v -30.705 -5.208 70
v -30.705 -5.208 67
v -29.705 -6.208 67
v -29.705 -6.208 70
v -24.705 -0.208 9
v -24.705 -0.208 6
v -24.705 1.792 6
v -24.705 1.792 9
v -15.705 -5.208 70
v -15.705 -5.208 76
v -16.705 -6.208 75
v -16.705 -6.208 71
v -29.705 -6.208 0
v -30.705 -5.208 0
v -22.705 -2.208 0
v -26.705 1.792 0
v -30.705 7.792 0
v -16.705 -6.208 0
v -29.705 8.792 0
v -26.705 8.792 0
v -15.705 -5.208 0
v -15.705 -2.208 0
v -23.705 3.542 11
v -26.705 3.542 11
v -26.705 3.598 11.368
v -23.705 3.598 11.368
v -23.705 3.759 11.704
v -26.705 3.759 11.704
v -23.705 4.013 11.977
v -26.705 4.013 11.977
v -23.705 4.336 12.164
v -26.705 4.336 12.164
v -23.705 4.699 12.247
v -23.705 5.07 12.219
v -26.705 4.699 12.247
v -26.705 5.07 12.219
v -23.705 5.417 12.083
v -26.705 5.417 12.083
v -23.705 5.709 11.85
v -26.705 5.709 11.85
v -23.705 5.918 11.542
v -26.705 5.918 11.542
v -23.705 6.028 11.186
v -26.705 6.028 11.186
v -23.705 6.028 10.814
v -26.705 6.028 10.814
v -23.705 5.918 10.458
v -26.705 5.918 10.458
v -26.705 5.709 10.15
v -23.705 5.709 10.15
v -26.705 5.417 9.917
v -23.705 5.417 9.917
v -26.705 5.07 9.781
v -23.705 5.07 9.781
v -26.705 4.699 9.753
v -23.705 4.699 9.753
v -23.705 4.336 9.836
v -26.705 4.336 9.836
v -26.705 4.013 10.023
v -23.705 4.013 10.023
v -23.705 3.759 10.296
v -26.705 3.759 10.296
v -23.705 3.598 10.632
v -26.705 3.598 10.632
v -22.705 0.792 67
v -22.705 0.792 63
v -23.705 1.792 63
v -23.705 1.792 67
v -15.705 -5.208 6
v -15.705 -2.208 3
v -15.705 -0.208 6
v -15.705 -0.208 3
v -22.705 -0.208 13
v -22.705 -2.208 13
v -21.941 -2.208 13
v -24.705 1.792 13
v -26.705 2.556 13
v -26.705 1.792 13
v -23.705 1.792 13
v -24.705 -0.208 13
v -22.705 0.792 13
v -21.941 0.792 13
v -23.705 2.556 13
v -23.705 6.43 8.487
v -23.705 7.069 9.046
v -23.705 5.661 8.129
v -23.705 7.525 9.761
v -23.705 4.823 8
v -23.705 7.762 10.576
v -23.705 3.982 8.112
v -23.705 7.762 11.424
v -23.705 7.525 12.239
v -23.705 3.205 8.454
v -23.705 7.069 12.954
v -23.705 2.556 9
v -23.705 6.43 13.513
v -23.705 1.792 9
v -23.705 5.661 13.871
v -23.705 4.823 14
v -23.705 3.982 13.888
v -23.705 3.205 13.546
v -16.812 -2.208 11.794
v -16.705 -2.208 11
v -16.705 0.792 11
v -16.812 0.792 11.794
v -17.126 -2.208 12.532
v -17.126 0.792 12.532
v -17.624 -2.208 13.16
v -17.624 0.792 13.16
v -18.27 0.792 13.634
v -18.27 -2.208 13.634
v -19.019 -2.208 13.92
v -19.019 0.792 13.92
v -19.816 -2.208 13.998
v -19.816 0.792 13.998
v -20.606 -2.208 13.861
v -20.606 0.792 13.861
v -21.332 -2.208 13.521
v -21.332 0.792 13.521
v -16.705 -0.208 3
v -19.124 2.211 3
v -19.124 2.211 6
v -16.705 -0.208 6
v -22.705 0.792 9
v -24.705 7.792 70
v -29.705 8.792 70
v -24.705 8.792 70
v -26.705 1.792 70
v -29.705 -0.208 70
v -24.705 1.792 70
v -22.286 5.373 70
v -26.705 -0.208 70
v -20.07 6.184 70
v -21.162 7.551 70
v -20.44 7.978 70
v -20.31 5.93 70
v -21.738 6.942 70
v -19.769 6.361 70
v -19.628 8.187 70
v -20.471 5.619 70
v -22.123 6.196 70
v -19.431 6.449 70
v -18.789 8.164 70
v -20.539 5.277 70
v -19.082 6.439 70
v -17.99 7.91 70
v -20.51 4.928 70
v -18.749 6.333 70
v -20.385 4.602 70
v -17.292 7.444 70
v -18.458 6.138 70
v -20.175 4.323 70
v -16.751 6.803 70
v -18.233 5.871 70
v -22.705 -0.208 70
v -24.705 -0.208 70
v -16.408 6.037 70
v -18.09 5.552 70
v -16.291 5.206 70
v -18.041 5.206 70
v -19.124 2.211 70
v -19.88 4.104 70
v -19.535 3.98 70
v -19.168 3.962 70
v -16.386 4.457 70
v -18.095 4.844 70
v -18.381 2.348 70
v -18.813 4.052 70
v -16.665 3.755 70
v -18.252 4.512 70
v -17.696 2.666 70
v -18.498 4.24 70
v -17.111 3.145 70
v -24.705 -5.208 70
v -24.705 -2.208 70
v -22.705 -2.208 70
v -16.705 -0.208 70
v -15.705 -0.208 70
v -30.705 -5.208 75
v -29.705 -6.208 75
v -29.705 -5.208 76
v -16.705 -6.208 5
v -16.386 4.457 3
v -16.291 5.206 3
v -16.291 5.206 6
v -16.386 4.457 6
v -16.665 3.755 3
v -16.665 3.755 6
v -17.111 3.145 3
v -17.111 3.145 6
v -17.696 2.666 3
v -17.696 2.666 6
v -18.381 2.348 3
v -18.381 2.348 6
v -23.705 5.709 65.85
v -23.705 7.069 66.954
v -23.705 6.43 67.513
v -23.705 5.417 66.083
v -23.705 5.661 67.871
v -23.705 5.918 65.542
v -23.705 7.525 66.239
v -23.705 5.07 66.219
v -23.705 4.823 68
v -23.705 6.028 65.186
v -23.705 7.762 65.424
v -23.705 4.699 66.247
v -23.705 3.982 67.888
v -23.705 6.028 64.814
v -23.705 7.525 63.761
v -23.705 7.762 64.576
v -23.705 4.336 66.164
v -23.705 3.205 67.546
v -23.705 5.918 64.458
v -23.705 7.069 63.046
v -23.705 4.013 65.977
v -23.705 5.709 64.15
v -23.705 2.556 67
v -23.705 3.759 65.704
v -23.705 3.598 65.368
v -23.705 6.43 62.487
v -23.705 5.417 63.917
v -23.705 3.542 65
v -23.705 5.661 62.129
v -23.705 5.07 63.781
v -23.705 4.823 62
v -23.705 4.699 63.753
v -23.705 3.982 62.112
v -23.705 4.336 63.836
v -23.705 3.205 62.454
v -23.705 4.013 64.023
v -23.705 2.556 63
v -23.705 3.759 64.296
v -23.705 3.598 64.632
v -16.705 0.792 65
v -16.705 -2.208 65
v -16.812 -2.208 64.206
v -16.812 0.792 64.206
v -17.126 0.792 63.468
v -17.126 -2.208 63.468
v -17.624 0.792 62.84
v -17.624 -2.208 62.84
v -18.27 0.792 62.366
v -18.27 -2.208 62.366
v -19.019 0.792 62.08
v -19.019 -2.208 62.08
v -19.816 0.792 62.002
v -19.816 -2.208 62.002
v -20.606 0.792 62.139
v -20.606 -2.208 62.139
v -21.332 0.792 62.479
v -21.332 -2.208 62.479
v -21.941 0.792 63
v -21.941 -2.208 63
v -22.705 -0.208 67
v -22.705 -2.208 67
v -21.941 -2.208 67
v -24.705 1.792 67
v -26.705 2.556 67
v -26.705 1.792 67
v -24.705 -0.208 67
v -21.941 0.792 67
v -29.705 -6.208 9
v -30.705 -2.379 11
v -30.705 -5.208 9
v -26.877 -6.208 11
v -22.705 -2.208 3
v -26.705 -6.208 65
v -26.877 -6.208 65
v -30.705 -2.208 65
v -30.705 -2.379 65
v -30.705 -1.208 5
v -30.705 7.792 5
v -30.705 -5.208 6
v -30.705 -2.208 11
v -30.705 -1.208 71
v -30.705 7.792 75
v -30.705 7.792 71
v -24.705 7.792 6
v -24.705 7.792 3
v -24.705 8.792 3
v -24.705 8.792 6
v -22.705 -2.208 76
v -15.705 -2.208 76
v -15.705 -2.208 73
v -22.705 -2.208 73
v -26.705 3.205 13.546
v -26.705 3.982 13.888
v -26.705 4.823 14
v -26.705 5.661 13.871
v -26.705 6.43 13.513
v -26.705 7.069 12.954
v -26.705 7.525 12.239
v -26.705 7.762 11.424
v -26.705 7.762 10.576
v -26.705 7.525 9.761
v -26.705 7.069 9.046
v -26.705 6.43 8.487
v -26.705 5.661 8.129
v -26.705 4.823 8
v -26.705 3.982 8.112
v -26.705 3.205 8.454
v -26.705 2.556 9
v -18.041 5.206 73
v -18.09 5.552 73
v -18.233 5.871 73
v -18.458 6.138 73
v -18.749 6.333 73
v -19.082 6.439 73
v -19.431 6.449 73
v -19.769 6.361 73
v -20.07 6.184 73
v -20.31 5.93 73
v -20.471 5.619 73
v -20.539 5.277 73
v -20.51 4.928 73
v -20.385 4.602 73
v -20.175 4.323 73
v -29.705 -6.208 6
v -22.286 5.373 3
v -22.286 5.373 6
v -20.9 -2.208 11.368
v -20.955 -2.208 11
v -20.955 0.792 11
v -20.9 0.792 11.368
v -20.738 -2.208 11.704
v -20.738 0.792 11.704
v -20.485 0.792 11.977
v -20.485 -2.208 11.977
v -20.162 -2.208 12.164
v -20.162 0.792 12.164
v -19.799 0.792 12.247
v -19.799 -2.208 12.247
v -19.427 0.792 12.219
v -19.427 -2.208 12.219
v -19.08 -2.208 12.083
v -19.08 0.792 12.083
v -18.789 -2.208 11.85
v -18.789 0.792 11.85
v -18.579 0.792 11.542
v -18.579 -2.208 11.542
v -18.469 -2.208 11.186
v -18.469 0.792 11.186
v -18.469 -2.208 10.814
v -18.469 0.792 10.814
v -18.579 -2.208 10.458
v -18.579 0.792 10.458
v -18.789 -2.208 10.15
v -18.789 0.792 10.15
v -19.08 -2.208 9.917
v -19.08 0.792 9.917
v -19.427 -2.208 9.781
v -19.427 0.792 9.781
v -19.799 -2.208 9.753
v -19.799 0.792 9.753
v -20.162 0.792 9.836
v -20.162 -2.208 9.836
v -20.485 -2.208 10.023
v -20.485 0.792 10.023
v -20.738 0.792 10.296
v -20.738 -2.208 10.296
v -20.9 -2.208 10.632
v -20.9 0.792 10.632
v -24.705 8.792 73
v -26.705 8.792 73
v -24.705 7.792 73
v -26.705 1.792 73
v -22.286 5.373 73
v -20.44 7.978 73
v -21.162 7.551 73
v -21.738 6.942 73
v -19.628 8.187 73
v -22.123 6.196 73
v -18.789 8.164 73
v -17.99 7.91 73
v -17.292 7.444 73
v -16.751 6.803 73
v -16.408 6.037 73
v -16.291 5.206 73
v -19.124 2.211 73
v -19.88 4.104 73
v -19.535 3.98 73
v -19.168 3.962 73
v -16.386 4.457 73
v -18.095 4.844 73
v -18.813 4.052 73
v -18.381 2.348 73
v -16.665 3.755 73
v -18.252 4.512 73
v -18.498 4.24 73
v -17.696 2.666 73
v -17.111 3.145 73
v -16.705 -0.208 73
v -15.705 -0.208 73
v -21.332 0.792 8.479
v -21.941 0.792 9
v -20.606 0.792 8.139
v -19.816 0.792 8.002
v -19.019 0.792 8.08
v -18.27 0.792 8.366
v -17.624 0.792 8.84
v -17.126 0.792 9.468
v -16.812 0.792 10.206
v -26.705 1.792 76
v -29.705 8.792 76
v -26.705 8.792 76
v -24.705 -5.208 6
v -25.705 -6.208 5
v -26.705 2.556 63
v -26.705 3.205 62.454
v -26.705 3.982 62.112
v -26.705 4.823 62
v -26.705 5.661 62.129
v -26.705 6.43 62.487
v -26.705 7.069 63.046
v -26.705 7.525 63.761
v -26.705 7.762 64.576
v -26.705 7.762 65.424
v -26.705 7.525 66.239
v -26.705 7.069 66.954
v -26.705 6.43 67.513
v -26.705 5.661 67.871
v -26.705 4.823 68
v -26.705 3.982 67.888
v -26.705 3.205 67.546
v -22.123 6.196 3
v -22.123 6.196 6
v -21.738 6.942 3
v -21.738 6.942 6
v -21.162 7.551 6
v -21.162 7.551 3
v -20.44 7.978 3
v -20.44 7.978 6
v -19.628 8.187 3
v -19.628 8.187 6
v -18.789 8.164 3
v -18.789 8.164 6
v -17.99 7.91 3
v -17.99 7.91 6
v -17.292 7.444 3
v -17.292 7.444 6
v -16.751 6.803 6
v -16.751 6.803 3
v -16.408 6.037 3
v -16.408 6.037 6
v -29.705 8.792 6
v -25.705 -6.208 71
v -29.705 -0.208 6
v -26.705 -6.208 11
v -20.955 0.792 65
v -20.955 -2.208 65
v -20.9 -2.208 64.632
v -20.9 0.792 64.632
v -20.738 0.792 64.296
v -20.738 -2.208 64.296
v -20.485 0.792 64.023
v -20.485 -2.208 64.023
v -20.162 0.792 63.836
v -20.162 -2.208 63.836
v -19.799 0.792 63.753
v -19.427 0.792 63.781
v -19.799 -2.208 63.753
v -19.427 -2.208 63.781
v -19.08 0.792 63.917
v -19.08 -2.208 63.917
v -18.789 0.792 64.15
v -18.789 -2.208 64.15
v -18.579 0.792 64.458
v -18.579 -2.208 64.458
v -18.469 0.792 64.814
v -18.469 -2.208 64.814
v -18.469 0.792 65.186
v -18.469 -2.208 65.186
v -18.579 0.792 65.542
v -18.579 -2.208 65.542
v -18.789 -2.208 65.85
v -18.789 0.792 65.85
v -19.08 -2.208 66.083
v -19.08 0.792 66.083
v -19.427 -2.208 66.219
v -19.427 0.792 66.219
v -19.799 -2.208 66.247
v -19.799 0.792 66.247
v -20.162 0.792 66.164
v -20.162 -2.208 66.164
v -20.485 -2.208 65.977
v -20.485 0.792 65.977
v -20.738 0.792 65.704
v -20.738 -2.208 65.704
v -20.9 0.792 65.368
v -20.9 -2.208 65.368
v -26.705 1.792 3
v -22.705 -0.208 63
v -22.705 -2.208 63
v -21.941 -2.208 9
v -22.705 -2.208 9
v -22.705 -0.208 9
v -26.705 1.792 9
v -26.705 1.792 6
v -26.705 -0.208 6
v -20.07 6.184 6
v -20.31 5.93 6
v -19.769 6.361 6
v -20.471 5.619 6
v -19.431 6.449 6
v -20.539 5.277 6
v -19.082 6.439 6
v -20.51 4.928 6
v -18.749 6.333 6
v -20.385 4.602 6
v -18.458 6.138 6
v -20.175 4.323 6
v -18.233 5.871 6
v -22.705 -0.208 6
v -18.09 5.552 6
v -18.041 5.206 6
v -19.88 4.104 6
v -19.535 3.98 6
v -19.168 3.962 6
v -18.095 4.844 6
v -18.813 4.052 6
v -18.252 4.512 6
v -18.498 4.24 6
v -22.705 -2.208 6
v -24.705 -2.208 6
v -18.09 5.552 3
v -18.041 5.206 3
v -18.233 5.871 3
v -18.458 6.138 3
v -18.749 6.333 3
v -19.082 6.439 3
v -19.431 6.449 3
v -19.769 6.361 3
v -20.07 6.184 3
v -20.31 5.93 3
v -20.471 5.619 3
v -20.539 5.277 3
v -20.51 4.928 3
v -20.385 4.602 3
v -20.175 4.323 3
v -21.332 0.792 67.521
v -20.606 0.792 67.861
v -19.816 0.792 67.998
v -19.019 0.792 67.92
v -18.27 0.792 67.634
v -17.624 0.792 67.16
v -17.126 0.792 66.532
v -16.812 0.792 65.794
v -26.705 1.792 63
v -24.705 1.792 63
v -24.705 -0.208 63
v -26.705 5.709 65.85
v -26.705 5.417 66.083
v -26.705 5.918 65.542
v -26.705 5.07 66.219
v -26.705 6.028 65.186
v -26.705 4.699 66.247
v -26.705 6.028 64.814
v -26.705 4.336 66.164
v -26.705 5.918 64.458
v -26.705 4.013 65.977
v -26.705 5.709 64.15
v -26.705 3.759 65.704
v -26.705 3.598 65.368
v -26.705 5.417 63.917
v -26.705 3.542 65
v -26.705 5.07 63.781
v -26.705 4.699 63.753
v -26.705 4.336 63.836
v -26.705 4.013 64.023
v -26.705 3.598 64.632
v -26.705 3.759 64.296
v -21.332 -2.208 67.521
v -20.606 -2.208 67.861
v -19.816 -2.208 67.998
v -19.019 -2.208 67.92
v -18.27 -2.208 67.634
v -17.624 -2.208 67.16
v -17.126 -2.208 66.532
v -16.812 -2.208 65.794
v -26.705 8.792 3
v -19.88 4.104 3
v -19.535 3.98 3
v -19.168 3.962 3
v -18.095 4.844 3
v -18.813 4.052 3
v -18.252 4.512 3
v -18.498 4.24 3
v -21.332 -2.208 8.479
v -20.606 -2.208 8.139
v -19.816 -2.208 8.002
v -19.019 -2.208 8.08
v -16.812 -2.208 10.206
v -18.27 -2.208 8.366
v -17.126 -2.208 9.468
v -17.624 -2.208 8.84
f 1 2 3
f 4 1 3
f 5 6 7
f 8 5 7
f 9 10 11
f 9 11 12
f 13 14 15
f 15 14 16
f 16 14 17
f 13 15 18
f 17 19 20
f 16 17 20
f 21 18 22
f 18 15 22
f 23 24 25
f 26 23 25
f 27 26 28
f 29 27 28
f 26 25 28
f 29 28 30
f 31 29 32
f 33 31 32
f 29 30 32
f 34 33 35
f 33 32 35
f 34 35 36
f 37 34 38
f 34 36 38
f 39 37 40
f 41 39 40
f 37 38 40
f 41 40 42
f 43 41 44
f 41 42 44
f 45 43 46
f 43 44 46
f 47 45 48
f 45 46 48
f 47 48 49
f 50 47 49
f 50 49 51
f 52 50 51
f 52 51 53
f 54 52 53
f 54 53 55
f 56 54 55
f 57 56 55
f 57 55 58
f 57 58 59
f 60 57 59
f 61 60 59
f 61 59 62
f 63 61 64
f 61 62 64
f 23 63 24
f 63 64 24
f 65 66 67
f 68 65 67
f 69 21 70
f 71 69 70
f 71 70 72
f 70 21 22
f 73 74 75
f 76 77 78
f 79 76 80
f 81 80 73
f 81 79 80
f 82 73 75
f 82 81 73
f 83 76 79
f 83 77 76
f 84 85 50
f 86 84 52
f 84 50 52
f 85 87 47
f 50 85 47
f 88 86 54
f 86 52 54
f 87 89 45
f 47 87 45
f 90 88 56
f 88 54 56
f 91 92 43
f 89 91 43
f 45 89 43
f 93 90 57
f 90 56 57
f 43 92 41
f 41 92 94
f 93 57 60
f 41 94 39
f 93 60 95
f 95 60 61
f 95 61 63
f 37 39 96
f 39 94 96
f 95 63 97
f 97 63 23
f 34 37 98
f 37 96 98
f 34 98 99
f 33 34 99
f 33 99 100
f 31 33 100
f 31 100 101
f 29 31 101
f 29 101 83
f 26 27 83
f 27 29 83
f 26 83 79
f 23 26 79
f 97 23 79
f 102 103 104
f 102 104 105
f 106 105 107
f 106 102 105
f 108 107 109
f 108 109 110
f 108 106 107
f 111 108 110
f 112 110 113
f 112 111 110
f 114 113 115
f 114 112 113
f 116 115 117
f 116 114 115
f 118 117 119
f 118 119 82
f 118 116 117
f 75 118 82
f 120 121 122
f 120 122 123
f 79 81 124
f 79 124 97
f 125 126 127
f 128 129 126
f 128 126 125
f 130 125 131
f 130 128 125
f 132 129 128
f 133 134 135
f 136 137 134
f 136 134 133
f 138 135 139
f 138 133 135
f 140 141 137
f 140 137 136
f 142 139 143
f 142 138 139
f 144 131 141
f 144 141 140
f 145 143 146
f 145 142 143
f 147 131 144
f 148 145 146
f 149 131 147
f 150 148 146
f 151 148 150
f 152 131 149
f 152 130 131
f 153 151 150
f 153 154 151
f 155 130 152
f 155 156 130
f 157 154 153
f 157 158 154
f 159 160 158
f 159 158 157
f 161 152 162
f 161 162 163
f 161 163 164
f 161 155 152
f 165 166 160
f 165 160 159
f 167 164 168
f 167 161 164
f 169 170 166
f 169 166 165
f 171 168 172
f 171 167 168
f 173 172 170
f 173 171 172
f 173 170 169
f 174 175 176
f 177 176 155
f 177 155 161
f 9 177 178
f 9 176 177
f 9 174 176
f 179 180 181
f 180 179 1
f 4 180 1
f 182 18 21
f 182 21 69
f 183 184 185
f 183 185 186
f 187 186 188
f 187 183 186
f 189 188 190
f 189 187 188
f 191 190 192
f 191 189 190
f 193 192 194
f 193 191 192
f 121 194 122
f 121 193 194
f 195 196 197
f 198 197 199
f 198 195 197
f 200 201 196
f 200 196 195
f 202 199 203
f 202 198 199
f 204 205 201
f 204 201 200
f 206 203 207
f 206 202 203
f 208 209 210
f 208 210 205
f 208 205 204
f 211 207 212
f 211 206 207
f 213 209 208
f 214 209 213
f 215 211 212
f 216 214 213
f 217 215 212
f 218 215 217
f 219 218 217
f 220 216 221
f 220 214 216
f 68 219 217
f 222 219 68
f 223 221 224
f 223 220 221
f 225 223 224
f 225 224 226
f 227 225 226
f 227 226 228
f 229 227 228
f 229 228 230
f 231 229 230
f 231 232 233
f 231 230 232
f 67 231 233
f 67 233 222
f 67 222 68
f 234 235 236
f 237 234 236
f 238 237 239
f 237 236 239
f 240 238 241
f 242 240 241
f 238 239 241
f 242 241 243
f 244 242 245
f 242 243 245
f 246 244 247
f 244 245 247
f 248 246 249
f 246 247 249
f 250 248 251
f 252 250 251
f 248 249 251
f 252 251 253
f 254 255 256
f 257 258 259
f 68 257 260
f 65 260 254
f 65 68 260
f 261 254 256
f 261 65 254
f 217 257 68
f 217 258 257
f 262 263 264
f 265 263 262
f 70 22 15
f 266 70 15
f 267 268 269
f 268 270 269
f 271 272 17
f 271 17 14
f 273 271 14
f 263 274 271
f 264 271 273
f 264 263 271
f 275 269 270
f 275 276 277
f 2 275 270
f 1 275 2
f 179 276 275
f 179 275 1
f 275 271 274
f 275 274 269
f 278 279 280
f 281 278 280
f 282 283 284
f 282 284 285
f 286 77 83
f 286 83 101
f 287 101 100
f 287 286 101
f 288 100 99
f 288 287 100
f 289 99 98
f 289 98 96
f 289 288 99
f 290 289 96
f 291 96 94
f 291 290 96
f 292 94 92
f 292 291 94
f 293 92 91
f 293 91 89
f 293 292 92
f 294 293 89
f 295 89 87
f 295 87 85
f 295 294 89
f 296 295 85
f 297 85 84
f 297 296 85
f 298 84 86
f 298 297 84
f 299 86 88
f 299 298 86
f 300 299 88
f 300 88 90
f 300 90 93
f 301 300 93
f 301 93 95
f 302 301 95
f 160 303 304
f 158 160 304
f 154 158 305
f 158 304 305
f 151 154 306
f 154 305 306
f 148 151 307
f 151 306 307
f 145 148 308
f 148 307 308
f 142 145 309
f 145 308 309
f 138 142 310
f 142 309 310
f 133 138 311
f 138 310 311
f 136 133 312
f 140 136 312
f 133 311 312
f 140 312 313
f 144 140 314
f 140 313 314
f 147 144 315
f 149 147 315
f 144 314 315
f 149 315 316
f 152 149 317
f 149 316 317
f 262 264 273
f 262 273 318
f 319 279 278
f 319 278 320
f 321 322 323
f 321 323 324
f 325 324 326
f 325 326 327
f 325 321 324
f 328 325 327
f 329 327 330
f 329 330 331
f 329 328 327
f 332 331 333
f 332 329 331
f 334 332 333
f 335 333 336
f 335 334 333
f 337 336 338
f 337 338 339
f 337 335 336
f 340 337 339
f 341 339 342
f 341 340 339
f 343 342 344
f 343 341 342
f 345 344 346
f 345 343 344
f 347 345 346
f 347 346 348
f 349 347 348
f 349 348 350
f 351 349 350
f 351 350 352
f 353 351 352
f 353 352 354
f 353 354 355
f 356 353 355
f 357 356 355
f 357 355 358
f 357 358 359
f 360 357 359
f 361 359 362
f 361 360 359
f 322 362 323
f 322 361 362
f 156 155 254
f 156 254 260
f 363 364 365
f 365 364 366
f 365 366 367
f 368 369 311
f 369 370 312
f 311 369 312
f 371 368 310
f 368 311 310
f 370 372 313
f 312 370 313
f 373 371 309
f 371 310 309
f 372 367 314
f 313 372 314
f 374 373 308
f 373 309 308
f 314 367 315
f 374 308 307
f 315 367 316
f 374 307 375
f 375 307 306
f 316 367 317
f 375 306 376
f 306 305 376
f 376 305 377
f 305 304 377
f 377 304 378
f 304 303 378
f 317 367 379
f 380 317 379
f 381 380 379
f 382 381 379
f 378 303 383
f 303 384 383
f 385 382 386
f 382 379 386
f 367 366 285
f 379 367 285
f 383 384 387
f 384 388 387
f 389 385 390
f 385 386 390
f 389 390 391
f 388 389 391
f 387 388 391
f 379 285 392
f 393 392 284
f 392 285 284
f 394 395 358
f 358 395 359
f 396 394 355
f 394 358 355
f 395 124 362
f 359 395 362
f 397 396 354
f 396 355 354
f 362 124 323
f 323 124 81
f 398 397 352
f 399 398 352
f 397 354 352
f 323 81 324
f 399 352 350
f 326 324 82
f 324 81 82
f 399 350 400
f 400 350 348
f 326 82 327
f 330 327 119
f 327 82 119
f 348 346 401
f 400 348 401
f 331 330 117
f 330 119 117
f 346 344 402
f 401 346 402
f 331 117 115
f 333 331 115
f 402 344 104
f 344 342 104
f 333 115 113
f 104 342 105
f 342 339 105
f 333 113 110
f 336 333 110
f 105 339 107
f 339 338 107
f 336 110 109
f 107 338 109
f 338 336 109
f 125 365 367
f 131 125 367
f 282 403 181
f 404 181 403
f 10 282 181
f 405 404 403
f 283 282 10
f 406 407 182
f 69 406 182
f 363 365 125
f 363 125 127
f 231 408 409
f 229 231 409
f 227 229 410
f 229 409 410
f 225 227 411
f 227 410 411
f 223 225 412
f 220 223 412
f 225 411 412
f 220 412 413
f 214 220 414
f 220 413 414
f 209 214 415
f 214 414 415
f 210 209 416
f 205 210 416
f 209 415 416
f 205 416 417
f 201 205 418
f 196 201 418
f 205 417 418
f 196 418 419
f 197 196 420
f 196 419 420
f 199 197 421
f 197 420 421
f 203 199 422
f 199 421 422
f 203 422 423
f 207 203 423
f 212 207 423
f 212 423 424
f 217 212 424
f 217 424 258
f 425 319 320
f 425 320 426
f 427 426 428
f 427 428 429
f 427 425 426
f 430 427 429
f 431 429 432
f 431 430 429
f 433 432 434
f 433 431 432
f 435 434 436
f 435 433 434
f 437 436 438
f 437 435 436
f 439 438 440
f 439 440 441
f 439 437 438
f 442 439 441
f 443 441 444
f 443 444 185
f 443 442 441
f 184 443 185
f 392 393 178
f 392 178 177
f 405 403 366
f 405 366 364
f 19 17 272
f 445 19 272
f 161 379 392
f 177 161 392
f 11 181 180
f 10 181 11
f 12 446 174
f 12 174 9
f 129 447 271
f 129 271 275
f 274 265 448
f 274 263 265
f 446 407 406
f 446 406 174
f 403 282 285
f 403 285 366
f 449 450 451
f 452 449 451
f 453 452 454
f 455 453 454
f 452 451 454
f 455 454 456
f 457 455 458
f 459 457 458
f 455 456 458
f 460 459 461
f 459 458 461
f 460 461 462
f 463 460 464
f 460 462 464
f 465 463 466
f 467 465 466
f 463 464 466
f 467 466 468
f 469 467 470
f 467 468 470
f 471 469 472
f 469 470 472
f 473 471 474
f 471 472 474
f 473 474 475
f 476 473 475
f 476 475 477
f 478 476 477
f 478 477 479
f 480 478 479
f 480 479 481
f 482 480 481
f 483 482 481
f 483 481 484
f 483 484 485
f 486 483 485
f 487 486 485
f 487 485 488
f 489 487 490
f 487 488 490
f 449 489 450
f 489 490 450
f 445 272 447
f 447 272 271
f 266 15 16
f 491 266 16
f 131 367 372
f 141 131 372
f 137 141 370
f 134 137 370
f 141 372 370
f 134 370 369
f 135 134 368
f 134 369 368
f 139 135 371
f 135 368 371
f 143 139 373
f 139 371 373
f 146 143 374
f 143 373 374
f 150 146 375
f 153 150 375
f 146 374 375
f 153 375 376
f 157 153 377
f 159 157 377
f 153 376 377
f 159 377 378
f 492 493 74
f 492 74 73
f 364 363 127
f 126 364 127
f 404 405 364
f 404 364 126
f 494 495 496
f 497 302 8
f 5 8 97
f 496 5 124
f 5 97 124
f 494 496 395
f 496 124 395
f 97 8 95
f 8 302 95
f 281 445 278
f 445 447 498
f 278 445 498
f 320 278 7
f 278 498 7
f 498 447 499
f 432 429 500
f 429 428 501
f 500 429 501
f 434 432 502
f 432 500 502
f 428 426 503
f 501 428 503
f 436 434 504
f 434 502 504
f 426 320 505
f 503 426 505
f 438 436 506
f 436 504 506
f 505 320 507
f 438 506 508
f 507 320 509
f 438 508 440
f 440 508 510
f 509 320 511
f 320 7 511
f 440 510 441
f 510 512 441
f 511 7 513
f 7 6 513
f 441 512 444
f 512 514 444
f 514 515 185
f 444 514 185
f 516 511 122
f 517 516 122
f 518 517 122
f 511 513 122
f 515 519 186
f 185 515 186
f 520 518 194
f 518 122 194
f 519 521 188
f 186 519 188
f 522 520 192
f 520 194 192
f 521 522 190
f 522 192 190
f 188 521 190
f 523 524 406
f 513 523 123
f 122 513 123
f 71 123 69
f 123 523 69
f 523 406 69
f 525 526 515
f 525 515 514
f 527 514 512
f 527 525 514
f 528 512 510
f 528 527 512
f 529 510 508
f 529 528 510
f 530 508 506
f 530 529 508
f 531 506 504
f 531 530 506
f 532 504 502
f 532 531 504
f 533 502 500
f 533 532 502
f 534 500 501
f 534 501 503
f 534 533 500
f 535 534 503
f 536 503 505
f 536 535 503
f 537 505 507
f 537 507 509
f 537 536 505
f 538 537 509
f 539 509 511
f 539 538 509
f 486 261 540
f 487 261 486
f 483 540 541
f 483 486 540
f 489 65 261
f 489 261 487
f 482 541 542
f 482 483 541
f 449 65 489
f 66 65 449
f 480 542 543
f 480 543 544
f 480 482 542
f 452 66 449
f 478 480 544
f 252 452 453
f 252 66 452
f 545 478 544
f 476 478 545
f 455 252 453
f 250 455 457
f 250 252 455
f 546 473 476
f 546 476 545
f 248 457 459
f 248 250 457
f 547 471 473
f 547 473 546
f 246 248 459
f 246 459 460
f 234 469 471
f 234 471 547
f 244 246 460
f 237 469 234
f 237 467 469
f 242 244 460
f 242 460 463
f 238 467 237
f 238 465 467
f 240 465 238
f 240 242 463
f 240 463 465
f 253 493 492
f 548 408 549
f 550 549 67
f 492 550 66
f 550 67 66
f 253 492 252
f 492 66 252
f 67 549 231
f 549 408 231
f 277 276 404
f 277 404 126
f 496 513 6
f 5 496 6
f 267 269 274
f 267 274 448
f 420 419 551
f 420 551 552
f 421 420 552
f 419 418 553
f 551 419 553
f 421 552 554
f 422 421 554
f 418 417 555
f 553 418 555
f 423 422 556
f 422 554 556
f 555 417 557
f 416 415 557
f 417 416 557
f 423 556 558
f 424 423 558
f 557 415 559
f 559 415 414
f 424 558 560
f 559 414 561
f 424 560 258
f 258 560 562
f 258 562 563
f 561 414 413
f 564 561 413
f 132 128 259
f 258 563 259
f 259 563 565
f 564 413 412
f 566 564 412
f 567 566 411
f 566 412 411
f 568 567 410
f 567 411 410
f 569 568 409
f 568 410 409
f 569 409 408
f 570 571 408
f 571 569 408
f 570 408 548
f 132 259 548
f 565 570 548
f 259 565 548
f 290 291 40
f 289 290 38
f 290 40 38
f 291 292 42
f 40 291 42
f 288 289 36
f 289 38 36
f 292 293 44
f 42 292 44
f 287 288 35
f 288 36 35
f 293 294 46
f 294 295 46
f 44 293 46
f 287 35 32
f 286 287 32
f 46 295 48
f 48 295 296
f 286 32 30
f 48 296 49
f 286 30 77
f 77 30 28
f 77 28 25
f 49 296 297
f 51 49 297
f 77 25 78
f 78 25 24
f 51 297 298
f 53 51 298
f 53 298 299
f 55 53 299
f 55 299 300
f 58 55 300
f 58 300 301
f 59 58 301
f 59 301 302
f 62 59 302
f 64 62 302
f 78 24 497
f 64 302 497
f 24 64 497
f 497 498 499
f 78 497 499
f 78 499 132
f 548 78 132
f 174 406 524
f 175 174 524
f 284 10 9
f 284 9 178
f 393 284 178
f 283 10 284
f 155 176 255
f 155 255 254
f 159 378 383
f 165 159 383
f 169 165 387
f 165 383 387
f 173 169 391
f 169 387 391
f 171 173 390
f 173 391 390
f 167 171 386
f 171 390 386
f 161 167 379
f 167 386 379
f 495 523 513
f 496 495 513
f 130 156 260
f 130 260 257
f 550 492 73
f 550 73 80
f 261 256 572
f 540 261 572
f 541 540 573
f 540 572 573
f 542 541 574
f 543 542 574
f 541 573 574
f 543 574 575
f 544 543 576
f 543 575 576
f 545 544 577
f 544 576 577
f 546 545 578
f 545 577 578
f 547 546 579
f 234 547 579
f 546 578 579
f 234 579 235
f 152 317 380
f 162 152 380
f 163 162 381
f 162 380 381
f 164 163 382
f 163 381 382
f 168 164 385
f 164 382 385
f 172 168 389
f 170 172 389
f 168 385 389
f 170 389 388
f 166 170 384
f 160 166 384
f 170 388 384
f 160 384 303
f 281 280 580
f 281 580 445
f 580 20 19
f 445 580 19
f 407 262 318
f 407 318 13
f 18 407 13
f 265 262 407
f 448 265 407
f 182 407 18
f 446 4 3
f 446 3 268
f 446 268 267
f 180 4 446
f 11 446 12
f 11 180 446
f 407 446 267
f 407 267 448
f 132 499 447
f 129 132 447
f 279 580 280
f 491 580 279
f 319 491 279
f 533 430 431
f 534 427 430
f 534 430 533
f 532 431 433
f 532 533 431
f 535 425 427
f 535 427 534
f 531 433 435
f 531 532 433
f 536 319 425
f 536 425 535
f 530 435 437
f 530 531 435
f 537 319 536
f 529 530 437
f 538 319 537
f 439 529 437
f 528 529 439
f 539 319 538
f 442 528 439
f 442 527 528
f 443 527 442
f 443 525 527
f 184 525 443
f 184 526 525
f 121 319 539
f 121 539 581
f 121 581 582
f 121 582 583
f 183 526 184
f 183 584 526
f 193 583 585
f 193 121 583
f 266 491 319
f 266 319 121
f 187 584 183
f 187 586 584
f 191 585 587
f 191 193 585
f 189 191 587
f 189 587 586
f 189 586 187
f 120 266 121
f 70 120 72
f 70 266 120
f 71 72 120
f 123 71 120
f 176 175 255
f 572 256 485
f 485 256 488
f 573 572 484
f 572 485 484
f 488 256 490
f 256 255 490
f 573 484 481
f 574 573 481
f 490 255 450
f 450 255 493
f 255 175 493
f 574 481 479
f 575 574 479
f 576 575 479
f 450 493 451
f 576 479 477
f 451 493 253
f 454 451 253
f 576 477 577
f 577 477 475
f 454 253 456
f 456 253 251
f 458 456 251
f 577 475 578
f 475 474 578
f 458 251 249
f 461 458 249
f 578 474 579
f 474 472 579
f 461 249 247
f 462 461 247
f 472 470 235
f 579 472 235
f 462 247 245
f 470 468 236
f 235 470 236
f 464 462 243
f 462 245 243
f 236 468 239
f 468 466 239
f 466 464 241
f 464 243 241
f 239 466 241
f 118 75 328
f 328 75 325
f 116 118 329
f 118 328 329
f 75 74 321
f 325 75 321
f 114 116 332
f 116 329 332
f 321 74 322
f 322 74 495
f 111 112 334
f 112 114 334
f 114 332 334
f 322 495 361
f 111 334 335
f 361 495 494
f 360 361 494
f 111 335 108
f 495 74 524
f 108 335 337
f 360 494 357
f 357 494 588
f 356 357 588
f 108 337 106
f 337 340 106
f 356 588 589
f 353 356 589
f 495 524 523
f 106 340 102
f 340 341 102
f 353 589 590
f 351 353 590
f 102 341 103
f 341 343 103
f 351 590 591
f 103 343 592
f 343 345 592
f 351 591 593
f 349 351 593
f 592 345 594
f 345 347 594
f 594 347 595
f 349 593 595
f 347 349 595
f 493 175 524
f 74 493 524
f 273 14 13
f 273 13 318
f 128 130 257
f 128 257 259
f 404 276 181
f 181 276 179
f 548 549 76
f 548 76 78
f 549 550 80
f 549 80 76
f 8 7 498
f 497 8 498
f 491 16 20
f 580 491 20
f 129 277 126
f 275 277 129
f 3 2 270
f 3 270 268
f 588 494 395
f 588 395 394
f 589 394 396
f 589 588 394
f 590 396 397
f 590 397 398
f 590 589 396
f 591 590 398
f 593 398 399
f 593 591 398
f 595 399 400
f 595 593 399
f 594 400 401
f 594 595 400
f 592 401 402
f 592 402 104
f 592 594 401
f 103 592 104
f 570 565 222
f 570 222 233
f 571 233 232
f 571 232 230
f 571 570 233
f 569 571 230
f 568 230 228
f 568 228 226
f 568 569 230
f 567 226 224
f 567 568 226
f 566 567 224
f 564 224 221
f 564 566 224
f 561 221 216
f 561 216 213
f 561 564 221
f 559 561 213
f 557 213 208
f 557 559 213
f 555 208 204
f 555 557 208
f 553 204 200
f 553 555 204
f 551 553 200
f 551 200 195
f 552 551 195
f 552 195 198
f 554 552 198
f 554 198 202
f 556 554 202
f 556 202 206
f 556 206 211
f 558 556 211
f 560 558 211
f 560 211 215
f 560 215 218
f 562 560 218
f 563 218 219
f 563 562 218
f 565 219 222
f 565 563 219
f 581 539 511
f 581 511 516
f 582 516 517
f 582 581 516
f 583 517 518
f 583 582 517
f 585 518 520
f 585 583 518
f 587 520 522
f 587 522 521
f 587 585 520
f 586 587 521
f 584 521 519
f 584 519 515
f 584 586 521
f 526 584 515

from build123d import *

# Parameters (mm, degrees)
F1_DEPTH  = 6
F2_W      = 2
F2_H      = 2
F3_DEPTH  = 5
F5_DEPTH  = 27
F7_DEPTH  = 3
F8_R      = 1.25
F9_DEPTH  = 3
F11_DEPTH = 4
F13_DEPTH = 3
F15_DEPTH = 3
F17_SIZE  = 0.99999
F18_SIZE  = 2


# Not quite as in the source:
# - a fillet or chamfer is up to 0.001 mm smaller than in the source, because OpenCascade refuses the exact size
# - a feature names something its author has since deleted; it is built from what else it names


with BuildPart() as f1:
    # F0 (on Top) → F1 (new body)
    with BuildSketch(Plane.XY):
        Polygon((-29.7051688433, 8.7922193985), (-30.7051688433, 8.7922193985), (-30.7051688433, -6.2077806015), (-15.7051688433, -6.2077806015), (-15.7051688433, -5.2077806015), (-15.7051688433, -0.2077806015), (-24.7051688433, -0.2077806015), (-24.7051688433, 8.7922193985), align=None)
    extrude(amount=F1_DEPTH)

    # F2 (on face) → F3 (join)
    with BuildSketch(Plane.XY.offset(6)):
        with Locations((-23.7051688433, -1.2077806015)):
            Rectangle(F2_W, F2_H)
        Polygon((-26.7051688433, -0.2077806015), (-30.7051688433, -0.2077806015), (-30.7051688433, -5.2077806015), (-29.7051688433, -6.2077806015), (-24.7051688433, -6.2077806015), (-24.7051688433, -2.2077806015), (-24.7051688433, -0.2077806015), align=None)
        with Locations((-25.7051688433, 0.7922193985)):
            Rectangle(F2_W, F2_H)
    extrude(amount=F3_DEPTH)

    # F4 (on face) → F5 (join)
    with BuildSketch(Plane.XY.offset(11)):
        Polygon((-26.7051688433, -6.2077806015), (-24.7051688433, -6.2077806015), (-24.7051688433, -2.2077806015), (-22.7051688433, -2.2077806015), (-22.7051688433, -0.2077806015), (-24.7051688433, -0.2077806015), (-24.7051688433, 1.7922193985), (-26.7051688433, 1.7922193985), (-26.7051688433, -0.2077806015), (-30.7051688433, -0.2077806015), (-30.7051688433, -2.2077806015), align=None)
    extrude(amount=F5_DEPTH)

    # F6 (on face) → F7 (join)
    with BuildSketch(Plane.XZ.offset(2.2077806015)):
        with BuildLine():
            ThreePointArc((-21.9412368208, 13), (-22.5076859202, 12.0704662693), (-22.7051688433, 11))
            ThreePointArc((-22.7051688433, 11), (-22.5076859202, 9.9295337307), (-21.9412368208, 9))
            ThreePointArc((-21.9412368208, 9), (-18.634702574, 8.1974829231), (-16.7051688433, 11))
            ThreePointArc((-16.7051688433, 11), (-18.634702574, 13.8025170769), (-21.9412368208, 13))
        make_face()
        with BuildLine():
            ThreePointArc((-18.4551688433, 11), (-19.7051688433, 9.75), (-20.9551688433, 11))
            ThreePointArc((-20.9551688433, 11), (-19.7051688433, 12.25), (-18.4551688433, 11))
        make_face(mode=Mode.SUBTRACT)
        with BuildLine():
            Line((-22.7051688433, 13), (-22.7051688433, 11))
            ThreePointArc((-22.7051688433, 11), (-22.5076859202, 12.0704662693), (-21.9412368208, 13))
            Line((-21.9412368208, 13), (-22.7051688433, 13))
        make_face()
        with BuildLine():
            Line((-22.7051688433, 11), (-22.7051688433, 9))
            Line((-22.7051688433, 9), (-21.9412368208, 9))
            ThreePointArc((-21.9412368208, 9), (-22.5076859202, 9.9295337307), (-22.7051688433, 11))
        make_face()
    extrude(amount=-F7_DEPTH)

    # F8 (on face) → F9 (join)
    with BuildSketch(Plane(origin=(-26.7051688433, 0, 0), x_dir=(0, -1, 0), z_dir=(-1, 0, 0))):
        with BuildLine():
            Line((-2.556151421, 9), (-1.7922193985, 9))
            Line((-1.7922193985, 9), (-1.7922193985, 11))
            ThreePointArc((-1.7922193985, 11), (-1.9897023217, 9.9295337307), (-2.556151421, 9))
        make_face()
        with BuildLine():
            ThreePointArc((-2.556151421, 13), (-1.9897023217, 12.0704662693), (-1.7922193985, 11))
            Line((-1.7922193985, 11), (-1.7922193985, 13))
            Line((-1.7922193985, 13), (-2.556151421, 13))
        make_face()
        with BuildLine():
            ThreePointArc((-2.556151421, 9), (-1.9897023217, 9.9295337307), (-1.7922193985, 11))
            ThreePointArc((-1.7922193985, 11), (-1.9897023217, 12.0704662693), (-2.556151421, 13))
            ThreePointArc((-2.556151421, 13), (-7.7922193985, 11), (-2.556151421, 9))
        make_face()
        with Locations((-4.7922193985, 11)):
            Circle(F8_R, mode=Mode.SUBTRACT)
    extrude(amount=-F9_DEPTH)

    # F10 (on face) → F11 (join)
    with BuildSketch(Plane.XY.offset(13)):
        Polygon((-22.7051688433, 0.7922193985), (-23.7051688433, 1.7922193985), (-24.7051688433, 1.7922193985), (-24.7051688433, -0.2077806015), (-22.7051688433, -0.2077806015), align=None)
    extrude(amount=-F11_DEPTH)

    # F12 (on face) → F13 (cut)
    with BuildSketch(Plane(origin=(0, 0, 0), x_dir=(1, 0, 0), z_dir=(0, 0, -1))):
        Polygon((-24.7051688433, -8.7922193985), (-24.7051688433, 0.2077806015), (-26.7051688433, -1.7922193985), (-26.7051688433, -8.7922193985), align=None)
        Polygon((-24.7051688433, 0.2077806015), (-15.7051688433, 0.2077806015), (-15.7051688433, 2.2077806015), (-22.7051688433, 2.2077806015), align=None)
    extrude(amount=-F13_DEPTH, mode=Mode.SUBTRACT)

    # F14 (on face) → F15 (join)
    with BuildSketch(Plane(origin=(0, 0, 3), x_dir=(1, 0, 0), z_dir=(0, 0, -1))):
        with BuildLine():
            Line((-16.7051688433, 0.2077806015), (-24.7051688433, 0.2077806015))
            Line((-24.7051688433, 0.2077806015), (-24.7051688433, -7.7922193985))
            Line((-24.7051688433, -7.7922193985), (-22.2863076734, -5.3733582286))
            ThreePointArc((-22.2863076734, -5.3733582286), (-21.4122756245, -3.0851126174), (-19.1240300132, -2.2110805685))
            Line((-19.1240300132, -2.2110805685), (-16.7051688433, 0.2077806015))
        make_face()
        with BuildLine():
            ThreePointArc((-19.1240300132, -2.2110805685), (-21.4122756245, -3.0851126174), (-22.2863076734, -5.3733582286))
            Line((-22.2863076734, -5.3733582286), (-20.7051688433, -3.7922193985))
            Line((-20.7051688433, -3.7922193985), (-19.1240300132, -2.2110805685))
        make_face()
        with BuildLine():
            Line((-20.7051688433, -3.7922193985), (-22.2863076734, -5.3733582286))
            ThreePointArc((-22.2863076734, -5.3733582286), (-19.2074603031, -8.2052708339), (-16.2909552809, -5.2064329609))
            ThreePointArc((-16.2909552809, -5.2064329609), (-17.1114168202, -3.1449742302), (-19.1240300132, -2.2110805685))
            Line((-19.1240300132, -2.2110805685), (-20.7051688433, -3.7922193985))
        make_face()
        with BuildLine():
            ThreePointArc((-18.0409552809, -5.2064329609), (-19.7693095714, -6.3612823766), (-20.1748387574, -4.3225494844))
            ThreePointArc((-20.1748387574, -4.3225494844), (-18.8126009904, -4.0515835453), (-18.0409552809, -5.2064329609))
        make_face(mode=Mode.SUBTRACT)
    extrude(amount=-F15_DEPTH)

    # F16: F1 across face


with BuildPart() as f1_1:
    add(f1.part)
    add(f1.part.mirror(Plane(origin=(-26.6681318062, -2.1707435644, 38), x_dir=(1, 0, 0), z_dir=(0, 0, 1))))

    # F17 (size 1 in the source; OpenCascade refuses exactly that, so slightly less here)
    f17_edges = [f1_1.edges().sort_by_distance(p)[0] for p in [
        (-24.705169, -6.207781, 38),
        (-20.205169, -6.207781, 6),
        (-30.705169, 4.292219, 6),
        (-30.705169, -0.207781, 38),
        (-30.705169, 4.292219, 70),
        (-20.205169, -6.207781, 70),
        (-15.705169, -6.207781, 73),
        (-30.705169, 8.792219, 73),
        (-23.205169, -6.207781, 76),
        (-30.705169, -6.207781, 73),
        (-30.705169, 1.292219, 76),
        (-30.705169, 8.792219, 3),
        (-30.705169, -6.207781, 3),
        (-15.705169, -6.207781, 3),
    ]]
    chamfer(f17_edges, length=F17_SIZE)

    # F18
    f18_edges = [f1_1.edges().sort_by_distance(p)[0] for p in [
        (-30.205169, -5.707781, 11),
        (-30.205169, -5.707781, 65),
    ]]
    chamfer(f18_edges, length=F18_SIZE)


solid = f1_1.part
